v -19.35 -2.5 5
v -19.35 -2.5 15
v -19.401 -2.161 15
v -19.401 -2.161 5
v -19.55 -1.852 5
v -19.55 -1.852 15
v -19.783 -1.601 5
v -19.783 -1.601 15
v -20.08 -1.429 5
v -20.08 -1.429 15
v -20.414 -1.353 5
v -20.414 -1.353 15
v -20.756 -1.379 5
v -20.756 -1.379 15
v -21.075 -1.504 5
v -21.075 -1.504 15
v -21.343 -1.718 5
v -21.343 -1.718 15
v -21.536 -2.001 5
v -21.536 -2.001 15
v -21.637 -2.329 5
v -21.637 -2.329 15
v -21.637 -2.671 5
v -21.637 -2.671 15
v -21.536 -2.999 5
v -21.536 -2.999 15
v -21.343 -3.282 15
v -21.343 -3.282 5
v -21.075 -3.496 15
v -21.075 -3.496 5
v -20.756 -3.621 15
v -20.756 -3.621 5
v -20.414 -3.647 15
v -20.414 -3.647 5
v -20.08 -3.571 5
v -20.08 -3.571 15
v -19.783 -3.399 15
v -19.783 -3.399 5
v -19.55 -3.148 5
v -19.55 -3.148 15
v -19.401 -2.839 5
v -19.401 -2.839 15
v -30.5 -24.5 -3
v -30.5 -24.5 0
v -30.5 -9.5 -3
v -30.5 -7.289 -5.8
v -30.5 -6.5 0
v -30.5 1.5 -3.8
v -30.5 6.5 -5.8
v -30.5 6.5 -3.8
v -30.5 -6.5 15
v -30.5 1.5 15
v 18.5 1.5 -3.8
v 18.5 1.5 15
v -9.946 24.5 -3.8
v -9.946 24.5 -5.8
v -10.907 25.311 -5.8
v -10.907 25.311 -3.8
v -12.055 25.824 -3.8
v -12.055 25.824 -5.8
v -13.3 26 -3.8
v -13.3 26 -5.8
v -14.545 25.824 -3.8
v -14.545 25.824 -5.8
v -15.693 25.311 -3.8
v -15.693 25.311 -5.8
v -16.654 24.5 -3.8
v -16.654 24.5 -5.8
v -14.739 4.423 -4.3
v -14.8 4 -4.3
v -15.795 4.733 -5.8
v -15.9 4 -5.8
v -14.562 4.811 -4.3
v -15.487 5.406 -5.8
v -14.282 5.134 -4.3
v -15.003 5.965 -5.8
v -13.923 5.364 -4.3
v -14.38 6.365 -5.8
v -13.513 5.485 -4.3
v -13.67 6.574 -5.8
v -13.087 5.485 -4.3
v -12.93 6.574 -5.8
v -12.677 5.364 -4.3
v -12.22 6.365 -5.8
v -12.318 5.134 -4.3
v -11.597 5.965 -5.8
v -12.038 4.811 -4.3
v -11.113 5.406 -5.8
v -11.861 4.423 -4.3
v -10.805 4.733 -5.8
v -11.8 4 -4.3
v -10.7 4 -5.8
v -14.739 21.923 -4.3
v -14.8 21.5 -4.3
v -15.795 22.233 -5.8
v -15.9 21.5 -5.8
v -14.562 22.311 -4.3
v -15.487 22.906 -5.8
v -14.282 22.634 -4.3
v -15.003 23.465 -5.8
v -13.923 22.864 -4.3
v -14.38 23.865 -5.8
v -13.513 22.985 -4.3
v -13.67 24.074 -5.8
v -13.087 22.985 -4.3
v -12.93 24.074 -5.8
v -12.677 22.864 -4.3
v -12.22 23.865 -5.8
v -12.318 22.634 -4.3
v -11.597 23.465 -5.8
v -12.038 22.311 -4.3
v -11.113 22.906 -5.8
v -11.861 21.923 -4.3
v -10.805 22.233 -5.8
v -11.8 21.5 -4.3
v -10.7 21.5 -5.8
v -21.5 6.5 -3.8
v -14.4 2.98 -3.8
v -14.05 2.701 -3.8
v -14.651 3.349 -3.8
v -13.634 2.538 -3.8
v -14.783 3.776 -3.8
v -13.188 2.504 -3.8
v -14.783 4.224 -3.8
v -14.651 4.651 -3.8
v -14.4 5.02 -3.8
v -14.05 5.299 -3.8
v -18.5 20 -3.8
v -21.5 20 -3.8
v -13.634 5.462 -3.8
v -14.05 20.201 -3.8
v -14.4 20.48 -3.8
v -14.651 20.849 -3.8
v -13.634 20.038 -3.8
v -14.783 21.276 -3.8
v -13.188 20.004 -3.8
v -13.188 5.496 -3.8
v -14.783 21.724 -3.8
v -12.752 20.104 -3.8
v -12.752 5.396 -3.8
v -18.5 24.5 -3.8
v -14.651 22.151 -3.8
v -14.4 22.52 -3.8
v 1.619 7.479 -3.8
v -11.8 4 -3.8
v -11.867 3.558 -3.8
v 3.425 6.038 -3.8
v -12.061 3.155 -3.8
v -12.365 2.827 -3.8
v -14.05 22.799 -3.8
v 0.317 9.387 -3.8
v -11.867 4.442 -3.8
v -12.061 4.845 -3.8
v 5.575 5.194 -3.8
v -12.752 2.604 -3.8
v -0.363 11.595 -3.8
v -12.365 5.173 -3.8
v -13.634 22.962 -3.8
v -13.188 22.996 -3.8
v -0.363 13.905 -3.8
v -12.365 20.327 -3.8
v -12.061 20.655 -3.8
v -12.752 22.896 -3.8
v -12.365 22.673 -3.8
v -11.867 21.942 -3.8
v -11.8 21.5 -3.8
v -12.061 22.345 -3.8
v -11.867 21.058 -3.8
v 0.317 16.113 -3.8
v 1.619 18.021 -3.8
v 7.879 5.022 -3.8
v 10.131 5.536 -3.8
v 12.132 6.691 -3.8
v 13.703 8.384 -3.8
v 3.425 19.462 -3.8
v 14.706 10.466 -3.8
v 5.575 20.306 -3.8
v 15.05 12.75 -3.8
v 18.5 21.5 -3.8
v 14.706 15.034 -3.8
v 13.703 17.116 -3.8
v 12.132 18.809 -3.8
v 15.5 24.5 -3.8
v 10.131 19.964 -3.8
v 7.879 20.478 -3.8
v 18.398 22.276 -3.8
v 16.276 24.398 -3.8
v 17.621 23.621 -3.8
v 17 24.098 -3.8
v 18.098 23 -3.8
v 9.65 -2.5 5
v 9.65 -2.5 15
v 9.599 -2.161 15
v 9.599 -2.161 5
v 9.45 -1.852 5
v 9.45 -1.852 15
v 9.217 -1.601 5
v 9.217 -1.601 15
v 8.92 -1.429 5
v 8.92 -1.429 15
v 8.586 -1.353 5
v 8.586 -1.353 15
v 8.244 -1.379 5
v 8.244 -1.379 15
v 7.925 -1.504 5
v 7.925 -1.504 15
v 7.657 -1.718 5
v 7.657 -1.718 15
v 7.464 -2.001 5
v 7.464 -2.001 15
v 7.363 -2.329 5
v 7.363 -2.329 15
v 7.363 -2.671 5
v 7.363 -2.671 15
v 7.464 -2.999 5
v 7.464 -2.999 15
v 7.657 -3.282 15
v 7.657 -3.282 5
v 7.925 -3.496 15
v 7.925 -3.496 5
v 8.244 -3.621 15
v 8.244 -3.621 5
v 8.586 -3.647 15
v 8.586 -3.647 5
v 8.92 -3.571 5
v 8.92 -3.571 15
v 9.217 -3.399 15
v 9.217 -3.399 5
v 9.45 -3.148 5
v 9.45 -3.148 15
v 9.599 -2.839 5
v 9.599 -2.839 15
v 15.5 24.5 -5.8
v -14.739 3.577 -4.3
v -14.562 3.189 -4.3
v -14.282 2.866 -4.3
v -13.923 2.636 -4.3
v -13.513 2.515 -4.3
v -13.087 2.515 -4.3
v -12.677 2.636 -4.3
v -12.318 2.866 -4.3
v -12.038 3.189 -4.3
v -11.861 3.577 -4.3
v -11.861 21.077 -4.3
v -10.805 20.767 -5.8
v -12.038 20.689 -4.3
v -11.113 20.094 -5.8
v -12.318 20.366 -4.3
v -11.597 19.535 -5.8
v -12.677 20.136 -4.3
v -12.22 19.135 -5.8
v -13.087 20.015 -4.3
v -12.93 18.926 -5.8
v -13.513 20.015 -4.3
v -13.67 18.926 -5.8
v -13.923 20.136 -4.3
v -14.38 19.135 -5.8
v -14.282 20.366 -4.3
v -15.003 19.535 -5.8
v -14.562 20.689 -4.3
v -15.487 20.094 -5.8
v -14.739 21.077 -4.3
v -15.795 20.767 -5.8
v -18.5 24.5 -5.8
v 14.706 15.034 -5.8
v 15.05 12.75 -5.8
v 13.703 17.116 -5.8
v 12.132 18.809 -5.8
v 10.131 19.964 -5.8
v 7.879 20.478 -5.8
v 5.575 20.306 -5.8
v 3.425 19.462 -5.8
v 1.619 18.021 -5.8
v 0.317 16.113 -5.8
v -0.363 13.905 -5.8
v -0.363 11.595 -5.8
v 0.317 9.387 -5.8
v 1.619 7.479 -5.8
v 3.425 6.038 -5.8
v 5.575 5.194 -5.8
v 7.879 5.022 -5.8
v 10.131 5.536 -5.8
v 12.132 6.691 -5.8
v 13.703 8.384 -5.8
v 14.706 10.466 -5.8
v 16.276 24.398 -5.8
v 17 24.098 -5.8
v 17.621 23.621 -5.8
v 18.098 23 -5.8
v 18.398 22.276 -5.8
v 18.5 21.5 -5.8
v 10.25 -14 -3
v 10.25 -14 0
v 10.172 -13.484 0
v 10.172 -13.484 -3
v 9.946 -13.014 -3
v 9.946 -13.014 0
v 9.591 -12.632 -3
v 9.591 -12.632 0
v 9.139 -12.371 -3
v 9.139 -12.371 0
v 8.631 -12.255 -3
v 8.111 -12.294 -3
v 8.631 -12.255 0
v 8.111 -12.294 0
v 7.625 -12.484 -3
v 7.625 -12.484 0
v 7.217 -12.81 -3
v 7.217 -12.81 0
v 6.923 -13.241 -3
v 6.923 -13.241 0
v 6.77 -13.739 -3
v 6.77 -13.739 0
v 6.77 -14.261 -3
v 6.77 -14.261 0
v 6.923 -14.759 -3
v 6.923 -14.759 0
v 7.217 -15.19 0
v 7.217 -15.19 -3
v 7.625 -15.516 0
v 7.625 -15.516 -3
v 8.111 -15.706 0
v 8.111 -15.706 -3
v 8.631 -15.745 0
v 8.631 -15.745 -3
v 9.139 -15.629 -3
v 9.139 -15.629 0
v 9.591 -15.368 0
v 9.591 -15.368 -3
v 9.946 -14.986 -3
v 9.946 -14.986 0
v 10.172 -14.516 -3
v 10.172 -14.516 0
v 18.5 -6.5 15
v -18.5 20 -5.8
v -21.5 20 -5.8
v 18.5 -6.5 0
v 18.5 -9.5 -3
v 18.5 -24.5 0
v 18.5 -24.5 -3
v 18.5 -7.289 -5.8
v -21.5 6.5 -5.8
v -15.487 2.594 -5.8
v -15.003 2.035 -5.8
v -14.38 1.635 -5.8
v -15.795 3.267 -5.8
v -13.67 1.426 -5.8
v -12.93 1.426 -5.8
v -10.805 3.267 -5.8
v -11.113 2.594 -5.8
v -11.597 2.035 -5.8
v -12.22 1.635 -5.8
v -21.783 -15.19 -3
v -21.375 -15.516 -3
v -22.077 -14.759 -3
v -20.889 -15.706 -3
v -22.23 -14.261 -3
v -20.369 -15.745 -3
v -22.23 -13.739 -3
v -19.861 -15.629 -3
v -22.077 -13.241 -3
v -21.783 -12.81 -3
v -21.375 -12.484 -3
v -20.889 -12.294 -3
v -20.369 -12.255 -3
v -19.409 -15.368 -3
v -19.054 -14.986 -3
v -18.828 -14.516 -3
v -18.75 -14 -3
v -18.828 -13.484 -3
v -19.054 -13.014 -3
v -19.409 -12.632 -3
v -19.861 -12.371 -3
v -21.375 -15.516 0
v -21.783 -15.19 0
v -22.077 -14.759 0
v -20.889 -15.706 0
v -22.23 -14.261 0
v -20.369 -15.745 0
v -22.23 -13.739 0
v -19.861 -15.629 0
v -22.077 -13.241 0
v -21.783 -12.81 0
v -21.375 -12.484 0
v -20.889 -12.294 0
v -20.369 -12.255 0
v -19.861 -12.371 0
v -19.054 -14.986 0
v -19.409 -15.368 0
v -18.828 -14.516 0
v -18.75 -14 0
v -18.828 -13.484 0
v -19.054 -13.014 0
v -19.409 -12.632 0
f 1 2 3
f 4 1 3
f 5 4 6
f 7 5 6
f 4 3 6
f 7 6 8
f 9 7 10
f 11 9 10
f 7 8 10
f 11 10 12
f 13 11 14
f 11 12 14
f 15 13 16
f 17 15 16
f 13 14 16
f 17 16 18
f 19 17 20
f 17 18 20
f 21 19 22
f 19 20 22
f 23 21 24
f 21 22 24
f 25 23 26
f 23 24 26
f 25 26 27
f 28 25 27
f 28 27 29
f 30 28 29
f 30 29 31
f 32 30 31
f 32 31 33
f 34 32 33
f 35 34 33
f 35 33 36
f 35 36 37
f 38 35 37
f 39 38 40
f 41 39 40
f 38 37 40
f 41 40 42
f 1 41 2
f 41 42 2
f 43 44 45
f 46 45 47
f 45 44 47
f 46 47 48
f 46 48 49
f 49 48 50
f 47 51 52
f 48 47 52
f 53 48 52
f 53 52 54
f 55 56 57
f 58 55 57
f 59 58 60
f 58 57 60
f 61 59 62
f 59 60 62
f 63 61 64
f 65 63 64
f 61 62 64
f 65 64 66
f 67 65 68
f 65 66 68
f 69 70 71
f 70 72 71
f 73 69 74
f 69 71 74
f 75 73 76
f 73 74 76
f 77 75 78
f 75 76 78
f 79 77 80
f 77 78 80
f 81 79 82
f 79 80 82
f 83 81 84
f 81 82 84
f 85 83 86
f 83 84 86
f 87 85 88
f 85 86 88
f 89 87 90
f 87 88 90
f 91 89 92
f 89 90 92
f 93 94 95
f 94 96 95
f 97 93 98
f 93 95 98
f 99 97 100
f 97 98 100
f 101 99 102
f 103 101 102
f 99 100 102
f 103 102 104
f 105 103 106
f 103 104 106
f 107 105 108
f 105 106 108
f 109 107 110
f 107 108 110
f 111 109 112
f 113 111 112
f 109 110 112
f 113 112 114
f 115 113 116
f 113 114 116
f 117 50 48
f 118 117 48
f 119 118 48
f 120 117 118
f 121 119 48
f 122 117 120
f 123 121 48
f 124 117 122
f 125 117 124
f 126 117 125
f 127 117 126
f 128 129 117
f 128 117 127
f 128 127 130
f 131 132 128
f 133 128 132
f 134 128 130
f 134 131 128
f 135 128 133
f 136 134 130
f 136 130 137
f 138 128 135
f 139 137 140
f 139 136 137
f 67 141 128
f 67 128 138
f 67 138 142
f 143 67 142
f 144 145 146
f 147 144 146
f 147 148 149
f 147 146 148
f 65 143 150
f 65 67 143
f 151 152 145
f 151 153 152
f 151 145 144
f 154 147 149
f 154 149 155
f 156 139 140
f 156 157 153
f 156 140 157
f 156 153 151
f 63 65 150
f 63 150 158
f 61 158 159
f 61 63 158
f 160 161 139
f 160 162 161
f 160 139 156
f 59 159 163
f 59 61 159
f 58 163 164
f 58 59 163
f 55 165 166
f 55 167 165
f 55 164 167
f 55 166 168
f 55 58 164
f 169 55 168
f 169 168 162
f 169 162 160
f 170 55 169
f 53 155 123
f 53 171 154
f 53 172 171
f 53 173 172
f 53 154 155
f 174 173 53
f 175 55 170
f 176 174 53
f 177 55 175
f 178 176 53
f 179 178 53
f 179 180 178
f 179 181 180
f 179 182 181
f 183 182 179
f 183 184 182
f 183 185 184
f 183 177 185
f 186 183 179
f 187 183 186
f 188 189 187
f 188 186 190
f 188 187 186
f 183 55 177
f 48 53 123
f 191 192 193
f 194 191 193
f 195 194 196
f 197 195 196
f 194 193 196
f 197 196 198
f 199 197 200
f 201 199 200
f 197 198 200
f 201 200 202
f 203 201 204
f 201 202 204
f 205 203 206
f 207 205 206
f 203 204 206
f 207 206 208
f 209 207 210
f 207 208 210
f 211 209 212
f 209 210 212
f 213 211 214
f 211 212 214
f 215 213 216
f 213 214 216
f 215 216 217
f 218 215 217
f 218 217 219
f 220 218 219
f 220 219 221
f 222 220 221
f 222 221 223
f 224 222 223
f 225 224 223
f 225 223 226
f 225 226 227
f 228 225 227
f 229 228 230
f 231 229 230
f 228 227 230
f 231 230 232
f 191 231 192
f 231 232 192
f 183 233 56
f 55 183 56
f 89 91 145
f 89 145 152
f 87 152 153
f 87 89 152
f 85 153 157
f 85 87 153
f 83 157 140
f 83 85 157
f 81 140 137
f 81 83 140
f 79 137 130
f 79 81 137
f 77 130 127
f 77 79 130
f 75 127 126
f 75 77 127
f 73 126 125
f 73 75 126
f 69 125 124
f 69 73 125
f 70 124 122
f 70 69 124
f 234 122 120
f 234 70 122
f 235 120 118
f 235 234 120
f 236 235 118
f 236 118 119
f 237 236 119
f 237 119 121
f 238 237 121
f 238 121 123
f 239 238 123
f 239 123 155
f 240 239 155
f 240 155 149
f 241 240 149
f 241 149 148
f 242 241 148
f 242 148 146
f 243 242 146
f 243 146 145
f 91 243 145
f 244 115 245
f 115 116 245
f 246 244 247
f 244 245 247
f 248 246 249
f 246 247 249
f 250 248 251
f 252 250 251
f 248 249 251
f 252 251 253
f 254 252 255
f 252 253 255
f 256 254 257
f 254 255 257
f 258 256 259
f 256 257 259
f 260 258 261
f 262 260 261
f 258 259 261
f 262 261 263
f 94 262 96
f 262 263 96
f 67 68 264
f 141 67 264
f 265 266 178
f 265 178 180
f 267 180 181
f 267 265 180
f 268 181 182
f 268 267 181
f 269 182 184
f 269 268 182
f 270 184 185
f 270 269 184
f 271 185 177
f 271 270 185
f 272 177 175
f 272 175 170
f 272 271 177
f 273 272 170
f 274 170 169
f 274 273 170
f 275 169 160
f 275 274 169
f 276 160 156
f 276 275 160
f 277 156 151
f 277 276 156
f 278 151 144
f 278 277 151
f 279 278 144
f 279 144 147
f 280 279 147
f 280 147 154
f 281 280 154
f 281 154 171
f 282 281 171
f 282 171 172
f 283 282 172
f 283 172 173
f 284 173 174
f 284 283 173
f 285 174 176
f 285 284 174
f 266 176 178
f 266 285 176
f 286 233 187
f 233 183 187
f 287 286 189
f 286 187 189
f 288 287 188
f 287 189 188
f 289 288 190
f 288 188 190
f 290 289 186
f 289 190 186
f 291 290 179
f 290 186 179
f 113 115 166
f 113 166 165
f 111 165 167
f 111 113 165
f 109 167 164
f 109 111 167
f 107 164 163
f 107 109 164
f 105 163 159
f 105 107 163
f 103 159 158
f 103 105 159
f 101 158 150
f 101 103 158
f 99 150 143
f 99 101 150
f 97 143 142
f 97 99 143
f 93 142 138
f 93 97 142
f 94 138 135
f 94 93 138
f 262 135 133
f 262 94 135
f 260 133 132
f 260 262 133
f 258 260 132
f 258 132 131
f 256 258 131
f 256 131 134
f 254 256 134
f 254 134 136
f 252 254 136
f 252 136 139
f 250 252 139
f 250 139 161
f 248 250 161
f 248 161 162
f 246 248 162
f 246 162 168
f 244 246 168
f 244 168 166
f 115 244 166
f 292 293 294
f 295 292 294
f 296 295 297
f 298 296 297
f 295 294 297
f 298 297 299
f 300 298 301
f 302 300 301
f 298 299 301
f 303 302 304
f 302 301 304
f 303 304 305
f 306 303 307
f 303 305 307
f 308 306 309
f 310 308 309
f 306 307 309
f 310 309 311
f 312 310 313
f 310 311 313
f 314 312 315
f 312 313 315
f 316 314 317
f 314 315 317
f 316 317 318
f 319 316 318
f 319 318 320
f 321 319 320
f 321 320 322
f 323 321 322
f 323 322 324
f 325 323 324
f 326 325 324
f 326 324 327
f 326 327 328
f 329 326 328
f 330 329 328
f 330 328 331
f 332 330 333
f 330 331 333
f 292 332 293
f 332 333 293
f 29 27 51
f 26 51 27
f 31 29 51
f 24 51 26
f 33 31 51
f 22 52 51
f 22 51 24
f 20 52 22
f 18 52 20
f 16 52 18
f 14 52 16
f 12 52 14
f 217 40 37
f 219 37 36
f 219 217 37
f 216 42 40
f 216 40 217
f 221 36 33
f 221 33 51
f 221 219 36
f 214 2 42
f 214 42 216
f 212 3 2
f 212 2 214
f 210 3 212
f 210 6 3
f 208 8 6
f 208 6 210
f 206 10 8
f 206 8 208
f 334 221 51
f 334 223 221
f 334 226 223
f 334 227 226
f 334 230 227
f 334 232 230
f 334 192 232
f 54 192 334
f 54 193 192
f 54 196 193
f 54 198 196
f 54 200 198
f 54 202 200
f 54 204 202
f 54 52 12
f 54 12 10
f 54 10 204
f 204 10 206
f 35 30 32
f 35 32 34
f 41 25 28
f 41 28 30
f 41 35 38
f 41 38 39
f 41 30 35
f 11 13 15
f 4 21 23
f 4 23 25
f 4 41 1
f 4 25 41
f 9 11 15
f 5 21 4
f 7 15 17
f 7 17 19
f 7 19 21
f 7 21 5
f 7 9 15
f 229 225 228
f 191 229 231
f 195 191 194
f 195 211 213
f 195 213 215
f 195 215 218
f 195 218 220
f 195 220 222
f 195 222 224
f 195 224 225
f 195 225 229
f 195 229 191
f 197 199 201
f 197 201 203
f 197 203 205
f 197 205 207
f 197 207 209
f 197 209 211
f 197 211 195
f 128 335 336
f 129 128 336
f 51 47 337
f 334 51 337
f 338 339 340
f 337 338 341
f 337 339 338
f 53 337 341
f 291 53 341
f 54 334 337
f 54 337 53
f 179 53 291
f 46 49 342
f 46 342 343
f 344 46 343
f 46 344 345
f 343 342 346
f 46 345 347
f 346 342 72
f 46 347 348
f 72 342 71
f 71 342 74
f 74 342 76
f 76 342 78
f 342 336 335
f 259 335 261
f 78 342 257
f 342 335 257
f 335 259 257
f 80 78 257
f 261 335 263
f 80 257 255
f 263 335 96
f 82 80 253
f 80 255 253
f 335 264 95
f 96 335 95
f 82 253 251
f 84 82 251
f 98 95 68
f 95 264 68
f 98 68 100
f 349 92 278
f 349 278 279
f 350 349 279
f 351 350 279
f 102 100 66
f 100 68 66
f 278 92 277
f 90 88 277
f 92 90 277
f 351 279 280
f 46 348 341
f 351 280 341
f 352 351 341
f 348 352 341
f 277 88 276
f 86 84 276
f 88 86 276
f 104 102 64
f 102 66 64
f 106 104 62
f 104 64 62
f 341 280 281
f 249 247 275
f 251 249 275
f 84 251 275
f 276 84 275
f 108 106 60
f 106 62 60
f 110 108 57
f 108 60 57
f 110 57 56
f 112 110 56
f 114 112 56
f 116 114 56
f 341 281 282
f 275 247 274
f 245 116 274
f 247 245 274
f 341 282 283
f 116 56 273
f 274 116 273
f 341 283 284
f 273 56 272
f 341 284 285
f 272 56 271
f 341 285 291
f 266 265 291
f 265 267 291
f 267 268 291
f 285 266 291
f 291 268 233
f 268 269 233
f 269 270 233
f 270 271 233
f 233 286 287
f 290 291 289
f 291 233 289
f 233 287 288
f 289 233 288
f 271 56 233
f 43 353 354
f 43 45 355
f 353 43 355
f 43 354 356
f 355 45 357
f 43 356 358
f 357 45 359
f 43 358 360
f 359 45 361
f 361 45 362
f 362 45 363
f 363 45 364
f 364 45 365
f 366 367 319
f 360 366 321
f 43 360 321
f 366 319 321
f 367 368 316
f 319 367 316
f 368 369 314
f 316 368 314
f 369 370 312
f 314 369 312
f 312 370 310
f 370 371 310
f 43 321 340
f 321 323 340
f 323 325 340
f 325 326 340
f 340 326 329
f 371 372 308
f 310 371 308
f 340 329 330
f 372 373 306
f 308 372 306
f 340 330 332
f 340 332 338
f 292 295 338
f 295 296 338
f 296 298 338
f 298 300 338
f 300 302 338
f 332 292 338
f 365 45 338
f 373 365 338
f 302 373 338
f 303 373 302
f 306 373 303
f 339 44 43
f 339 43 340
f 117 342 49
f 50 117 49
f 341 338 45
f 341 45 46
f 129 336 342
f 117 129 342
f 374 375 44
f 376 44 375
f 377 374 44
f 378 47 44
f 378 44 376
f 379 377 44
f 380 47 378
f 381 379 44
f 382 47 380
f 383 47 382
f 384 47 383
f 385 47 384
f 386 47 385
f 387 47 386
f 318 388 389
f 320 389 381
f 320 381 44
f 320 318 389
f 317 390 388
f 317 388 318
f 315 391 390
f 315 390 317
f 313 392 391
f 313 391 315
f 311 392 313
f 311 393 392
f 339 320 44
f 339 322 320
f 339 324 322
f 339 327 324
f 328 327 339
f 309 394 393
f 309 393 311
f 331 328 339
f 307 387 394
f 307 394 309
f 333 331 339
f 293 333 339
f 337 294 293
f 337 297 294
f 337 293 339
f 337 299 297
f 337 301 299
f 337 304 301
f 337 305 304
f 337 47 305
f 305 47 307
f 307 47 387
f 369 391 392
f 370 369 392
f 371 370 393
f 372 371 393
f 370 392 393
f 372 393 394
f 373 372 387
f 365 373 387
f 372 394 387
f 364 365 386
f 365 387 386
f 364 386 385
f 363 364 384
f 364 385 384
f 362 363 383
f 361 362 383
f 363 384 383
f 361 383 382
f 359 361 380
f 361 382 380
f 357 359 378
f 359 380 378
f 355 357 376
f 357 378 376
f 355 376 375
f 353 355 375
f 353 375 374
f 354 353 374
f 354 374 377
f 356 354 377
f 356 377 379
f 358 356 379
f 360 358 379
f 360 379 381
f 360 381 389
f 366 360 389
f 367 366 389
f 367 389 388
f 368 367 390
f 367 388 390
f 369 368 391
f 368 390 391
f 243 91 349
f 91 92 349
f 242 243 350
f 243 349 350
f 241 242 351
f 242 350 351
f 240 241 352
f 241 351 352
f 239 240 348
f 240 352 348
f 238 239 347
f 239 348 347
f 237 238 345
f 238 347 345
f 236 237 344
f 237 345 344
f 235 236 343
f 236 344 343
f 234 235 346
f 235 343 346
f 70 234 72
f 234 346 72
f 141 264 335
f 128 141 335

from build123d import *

# Parameters (mm, degrees)
SKETCH_5_R              = 1.75
EXTRUDE_15981_DEPTH     = 3
EXTRUDE_2_DEPTH         = 15
EXTRUDE_2_DEPTH_BACK    = 5.8
SKETCH_6_W              = 49
SKETCH_6_H              = 8
EXTRUDE_START           = -5.8
SKETCH_7_R              = 1.5
SKETCH_7_R_2            = 7.75
EXTRUDE_3_DEPTH         = 2
CUT_EXTRUDE_START       = 15
SKETCH_9_R              = 1.15
CUT_EXTRUDE_16680_DEPTH = 10
CHAMFER_16885_SIZE      = 3
CHAMFER_16885_SIZE_2    = 3.8
FILLET_16929_R          = 3


with BuildPart() as part:
    # Sketch 5 → Extrude 15981 (new body)
    with BuildSketch(Plane.XY):
        Polygon((18.5, -24.5), (18.5, -6.5), (-30.5, -6.5), (-30.5, -24.5), (-18.5, -24.5), align=None)
        with Locations((-20.5, -14)):
            Circle(SKETCH_5_R, mode=Mode.SUBTRACT)
        with Locations((8.5, -14)):
            Circle(SKETCH_5_R, mode=Mode.SUBTRACT)
    extrude(amount=-EXTRUDE_15981_DEPTH)

    # Эскиз внешнего крепления двигателя колеса<6> → Extrude 2 (add, two sides: drawn at the far end of the back side and taken through both)
    with BuildSketch(Plane.XY.offset(-EXTRUDE_2_DEPTH_BACK)):
        with Locations((-6, -2.5)):
            Rectangle(SKETCH_6_W, SKETCH_6_H)
    extrude(amount=EXTRUDE_2_DEPTH + EXTRUDE_2_DEPTH_BACK)

    # Sketch 7 → Extrude 3 (add)
    with BuildSketch(Plane.XY.offset(EXTRUDE_START)):
        with BuildLine():
            ThreePointArc((-9.945898034, 24.5), (-13.3, 26), (-16.654101966, 24.5))
            Line((-16.654101966, 24.5), (-18.5, 24.5))
            Line((-18.5, 24.5), (-18.5, 20))
            Line((-18.5, 20), (-21.5, 20))
            Line((-21.5, 20), (-21.5, 6.5))
            Line((-21.5, 6.5), (-30.5, 6.5))
            Line((-30.5, 6.5), (-30.5, 1.5))
            Line((-30.5, 1.5), (18.5, 1.5))
            Line((18.5, 1.5), (18.5, 24.5))
            Line((18.5, 24.5), (-9.945898034, 24.5))
        make_face()
        with Locations((-13.3, 4)):
            Circle(SKETCH_7_R, mode=Mode.SUBTRACT)
        with Locations((-13.3, 21.5)):
            Circle(SKETCH_7_R, mode=Mode.SUBTRACT)
        with Locations((7.3, 12.75)):
            Circle(SKETCH_7_R_2, mode=Mode.SUBTRACT)
    extrude(amount=EXTRUDE_3_DEPTH)

    # Sketch 9 → Cut-Extrude 16680 (cut)
    with BuildSketch(Plane.XY.offset(CUT_EXTRUDE_START)):
        with Locations((8.5, -2.5)):
            Circle(SKETCH_9_R)
        with Locations((-20.5, -2.5)):
            Circle(SKETCH_9_R)
    extrude(amount=-CUT_EXTRUDE_16680_DEPTH, mode=Mode.SUBTRACT)

    # Chamfer 16786: read off the stored shape, not the designer's step
    # Chamfer 16786: loft between two sections, ruled curve by curve
    chamfer_16786_from = [
        Edge.make_three_point_arc((-11.8, 4, -4.3), (-13.3, 2.5, -4.3), (-14.8, 4, -4.3)),
        Edge.make_three_point_arc((-14.8, 4, -4.3), (-13.3, 5.5, -4.3), (-11.8, 4, -4.3)),
    ]
    chamfer_16786_to = [
        Edge.make_three_point_arc((-10.7, 4, -5.8), (-13.3, 1.4, -5.8), (-15.9, 4, -5.8)),
        Edge.make_three_point_arc((-15.9, 4, -5.8), (-13.3, 6.6, -5.8), (-10.7, 4, -5.8)),
    ]
    chamfer_16786 = Solid(Shell([*[Face.make_surface_from_curves(chamfer_16786_from[k], chamfer_16786_to[k]) for k in range(2)], Face(Wire(chamfer_16786_from)), Face(Wire(chamfer_16786_to))]))
    add(chamfer_16786, mode=Mode.SUBTRACT)

    # Chamfer 16786 2: loft between two sections, ruled curve by curve
    chamfer_16786_2_from = [
        Edge.make_three_point_arc((-11.8, 21.5, -4.3), (-13.3, 20, -4.3), (-14.8, 21.5, -4.3)),
        Edge.make_three_point_arc((-14.8, 21.5, -4.3), (-13.3, 23, -4.3), (-11.8, 21.5, -4.3)),
    ]
    chamfer_16786_2_to = [
        Edge.make_three_point_arc((-10.7, 21.5, -5.8), (-13.3, 18.9, -5.8), (-15.9, 21.5, -5.8)),
        Edge.make_three_point_arc((-15.9, 21.5, -5.8), (-13.3, 24.1, -5.8), (-10.7, 21.5, -5.8)),
    ]
    chamfer_16786_2 = Solid(Shell([*[Face.make_surface_from_curves(chamfer_16786_2_from[k], chamfer_16786_2_to[k]) for k in range(2)], Face(Wire(chamfer_16786_2_from)), Face(Wire(chamfer_16786_2_to))]))
    add(chamfer_16786_2, mode=Mode.SUBTRACT)

    # Chamfer 16885
    # the kernel refuses this chamfer: 3.8, 3 mm, written as the material it adds along each edge
    with BuildSketch(Plane(origin=(18.5, -6.5, -3), x_dir=(0, -1, 0), z_dir=(-1, 0, 0))) as chamfer_16885_piece_1_section:
        Polygon((CHAMFER_16885_SIZE, 0), (0, -CHAMFER_16885_SIZE_2), (0, 0), align=None)
    chamfer_16885_piece_1 = extrude(amount=49, mode=Mode.PRIVATE)
    chamfer_16885_piece_1 = split(chamfer_16885_piece_1, bisect_by=Plane(origin=(18.5, -6.5, -5.8), z_dir=(0, 0, 1)), keep=Keep.TOP, mode=Mode.PRIVATE)
    add(chamfer_16885_piece_1)

    # Fillet 16929
    fillet_16929_edges = [part.edges().sort_by_distance(p)[0] for p in [
        (18.5, 24.5, -4.8),
    ]]
    fillet(fillet_16929_edges, radius=FILLET_16929_R)


solid = part.part
